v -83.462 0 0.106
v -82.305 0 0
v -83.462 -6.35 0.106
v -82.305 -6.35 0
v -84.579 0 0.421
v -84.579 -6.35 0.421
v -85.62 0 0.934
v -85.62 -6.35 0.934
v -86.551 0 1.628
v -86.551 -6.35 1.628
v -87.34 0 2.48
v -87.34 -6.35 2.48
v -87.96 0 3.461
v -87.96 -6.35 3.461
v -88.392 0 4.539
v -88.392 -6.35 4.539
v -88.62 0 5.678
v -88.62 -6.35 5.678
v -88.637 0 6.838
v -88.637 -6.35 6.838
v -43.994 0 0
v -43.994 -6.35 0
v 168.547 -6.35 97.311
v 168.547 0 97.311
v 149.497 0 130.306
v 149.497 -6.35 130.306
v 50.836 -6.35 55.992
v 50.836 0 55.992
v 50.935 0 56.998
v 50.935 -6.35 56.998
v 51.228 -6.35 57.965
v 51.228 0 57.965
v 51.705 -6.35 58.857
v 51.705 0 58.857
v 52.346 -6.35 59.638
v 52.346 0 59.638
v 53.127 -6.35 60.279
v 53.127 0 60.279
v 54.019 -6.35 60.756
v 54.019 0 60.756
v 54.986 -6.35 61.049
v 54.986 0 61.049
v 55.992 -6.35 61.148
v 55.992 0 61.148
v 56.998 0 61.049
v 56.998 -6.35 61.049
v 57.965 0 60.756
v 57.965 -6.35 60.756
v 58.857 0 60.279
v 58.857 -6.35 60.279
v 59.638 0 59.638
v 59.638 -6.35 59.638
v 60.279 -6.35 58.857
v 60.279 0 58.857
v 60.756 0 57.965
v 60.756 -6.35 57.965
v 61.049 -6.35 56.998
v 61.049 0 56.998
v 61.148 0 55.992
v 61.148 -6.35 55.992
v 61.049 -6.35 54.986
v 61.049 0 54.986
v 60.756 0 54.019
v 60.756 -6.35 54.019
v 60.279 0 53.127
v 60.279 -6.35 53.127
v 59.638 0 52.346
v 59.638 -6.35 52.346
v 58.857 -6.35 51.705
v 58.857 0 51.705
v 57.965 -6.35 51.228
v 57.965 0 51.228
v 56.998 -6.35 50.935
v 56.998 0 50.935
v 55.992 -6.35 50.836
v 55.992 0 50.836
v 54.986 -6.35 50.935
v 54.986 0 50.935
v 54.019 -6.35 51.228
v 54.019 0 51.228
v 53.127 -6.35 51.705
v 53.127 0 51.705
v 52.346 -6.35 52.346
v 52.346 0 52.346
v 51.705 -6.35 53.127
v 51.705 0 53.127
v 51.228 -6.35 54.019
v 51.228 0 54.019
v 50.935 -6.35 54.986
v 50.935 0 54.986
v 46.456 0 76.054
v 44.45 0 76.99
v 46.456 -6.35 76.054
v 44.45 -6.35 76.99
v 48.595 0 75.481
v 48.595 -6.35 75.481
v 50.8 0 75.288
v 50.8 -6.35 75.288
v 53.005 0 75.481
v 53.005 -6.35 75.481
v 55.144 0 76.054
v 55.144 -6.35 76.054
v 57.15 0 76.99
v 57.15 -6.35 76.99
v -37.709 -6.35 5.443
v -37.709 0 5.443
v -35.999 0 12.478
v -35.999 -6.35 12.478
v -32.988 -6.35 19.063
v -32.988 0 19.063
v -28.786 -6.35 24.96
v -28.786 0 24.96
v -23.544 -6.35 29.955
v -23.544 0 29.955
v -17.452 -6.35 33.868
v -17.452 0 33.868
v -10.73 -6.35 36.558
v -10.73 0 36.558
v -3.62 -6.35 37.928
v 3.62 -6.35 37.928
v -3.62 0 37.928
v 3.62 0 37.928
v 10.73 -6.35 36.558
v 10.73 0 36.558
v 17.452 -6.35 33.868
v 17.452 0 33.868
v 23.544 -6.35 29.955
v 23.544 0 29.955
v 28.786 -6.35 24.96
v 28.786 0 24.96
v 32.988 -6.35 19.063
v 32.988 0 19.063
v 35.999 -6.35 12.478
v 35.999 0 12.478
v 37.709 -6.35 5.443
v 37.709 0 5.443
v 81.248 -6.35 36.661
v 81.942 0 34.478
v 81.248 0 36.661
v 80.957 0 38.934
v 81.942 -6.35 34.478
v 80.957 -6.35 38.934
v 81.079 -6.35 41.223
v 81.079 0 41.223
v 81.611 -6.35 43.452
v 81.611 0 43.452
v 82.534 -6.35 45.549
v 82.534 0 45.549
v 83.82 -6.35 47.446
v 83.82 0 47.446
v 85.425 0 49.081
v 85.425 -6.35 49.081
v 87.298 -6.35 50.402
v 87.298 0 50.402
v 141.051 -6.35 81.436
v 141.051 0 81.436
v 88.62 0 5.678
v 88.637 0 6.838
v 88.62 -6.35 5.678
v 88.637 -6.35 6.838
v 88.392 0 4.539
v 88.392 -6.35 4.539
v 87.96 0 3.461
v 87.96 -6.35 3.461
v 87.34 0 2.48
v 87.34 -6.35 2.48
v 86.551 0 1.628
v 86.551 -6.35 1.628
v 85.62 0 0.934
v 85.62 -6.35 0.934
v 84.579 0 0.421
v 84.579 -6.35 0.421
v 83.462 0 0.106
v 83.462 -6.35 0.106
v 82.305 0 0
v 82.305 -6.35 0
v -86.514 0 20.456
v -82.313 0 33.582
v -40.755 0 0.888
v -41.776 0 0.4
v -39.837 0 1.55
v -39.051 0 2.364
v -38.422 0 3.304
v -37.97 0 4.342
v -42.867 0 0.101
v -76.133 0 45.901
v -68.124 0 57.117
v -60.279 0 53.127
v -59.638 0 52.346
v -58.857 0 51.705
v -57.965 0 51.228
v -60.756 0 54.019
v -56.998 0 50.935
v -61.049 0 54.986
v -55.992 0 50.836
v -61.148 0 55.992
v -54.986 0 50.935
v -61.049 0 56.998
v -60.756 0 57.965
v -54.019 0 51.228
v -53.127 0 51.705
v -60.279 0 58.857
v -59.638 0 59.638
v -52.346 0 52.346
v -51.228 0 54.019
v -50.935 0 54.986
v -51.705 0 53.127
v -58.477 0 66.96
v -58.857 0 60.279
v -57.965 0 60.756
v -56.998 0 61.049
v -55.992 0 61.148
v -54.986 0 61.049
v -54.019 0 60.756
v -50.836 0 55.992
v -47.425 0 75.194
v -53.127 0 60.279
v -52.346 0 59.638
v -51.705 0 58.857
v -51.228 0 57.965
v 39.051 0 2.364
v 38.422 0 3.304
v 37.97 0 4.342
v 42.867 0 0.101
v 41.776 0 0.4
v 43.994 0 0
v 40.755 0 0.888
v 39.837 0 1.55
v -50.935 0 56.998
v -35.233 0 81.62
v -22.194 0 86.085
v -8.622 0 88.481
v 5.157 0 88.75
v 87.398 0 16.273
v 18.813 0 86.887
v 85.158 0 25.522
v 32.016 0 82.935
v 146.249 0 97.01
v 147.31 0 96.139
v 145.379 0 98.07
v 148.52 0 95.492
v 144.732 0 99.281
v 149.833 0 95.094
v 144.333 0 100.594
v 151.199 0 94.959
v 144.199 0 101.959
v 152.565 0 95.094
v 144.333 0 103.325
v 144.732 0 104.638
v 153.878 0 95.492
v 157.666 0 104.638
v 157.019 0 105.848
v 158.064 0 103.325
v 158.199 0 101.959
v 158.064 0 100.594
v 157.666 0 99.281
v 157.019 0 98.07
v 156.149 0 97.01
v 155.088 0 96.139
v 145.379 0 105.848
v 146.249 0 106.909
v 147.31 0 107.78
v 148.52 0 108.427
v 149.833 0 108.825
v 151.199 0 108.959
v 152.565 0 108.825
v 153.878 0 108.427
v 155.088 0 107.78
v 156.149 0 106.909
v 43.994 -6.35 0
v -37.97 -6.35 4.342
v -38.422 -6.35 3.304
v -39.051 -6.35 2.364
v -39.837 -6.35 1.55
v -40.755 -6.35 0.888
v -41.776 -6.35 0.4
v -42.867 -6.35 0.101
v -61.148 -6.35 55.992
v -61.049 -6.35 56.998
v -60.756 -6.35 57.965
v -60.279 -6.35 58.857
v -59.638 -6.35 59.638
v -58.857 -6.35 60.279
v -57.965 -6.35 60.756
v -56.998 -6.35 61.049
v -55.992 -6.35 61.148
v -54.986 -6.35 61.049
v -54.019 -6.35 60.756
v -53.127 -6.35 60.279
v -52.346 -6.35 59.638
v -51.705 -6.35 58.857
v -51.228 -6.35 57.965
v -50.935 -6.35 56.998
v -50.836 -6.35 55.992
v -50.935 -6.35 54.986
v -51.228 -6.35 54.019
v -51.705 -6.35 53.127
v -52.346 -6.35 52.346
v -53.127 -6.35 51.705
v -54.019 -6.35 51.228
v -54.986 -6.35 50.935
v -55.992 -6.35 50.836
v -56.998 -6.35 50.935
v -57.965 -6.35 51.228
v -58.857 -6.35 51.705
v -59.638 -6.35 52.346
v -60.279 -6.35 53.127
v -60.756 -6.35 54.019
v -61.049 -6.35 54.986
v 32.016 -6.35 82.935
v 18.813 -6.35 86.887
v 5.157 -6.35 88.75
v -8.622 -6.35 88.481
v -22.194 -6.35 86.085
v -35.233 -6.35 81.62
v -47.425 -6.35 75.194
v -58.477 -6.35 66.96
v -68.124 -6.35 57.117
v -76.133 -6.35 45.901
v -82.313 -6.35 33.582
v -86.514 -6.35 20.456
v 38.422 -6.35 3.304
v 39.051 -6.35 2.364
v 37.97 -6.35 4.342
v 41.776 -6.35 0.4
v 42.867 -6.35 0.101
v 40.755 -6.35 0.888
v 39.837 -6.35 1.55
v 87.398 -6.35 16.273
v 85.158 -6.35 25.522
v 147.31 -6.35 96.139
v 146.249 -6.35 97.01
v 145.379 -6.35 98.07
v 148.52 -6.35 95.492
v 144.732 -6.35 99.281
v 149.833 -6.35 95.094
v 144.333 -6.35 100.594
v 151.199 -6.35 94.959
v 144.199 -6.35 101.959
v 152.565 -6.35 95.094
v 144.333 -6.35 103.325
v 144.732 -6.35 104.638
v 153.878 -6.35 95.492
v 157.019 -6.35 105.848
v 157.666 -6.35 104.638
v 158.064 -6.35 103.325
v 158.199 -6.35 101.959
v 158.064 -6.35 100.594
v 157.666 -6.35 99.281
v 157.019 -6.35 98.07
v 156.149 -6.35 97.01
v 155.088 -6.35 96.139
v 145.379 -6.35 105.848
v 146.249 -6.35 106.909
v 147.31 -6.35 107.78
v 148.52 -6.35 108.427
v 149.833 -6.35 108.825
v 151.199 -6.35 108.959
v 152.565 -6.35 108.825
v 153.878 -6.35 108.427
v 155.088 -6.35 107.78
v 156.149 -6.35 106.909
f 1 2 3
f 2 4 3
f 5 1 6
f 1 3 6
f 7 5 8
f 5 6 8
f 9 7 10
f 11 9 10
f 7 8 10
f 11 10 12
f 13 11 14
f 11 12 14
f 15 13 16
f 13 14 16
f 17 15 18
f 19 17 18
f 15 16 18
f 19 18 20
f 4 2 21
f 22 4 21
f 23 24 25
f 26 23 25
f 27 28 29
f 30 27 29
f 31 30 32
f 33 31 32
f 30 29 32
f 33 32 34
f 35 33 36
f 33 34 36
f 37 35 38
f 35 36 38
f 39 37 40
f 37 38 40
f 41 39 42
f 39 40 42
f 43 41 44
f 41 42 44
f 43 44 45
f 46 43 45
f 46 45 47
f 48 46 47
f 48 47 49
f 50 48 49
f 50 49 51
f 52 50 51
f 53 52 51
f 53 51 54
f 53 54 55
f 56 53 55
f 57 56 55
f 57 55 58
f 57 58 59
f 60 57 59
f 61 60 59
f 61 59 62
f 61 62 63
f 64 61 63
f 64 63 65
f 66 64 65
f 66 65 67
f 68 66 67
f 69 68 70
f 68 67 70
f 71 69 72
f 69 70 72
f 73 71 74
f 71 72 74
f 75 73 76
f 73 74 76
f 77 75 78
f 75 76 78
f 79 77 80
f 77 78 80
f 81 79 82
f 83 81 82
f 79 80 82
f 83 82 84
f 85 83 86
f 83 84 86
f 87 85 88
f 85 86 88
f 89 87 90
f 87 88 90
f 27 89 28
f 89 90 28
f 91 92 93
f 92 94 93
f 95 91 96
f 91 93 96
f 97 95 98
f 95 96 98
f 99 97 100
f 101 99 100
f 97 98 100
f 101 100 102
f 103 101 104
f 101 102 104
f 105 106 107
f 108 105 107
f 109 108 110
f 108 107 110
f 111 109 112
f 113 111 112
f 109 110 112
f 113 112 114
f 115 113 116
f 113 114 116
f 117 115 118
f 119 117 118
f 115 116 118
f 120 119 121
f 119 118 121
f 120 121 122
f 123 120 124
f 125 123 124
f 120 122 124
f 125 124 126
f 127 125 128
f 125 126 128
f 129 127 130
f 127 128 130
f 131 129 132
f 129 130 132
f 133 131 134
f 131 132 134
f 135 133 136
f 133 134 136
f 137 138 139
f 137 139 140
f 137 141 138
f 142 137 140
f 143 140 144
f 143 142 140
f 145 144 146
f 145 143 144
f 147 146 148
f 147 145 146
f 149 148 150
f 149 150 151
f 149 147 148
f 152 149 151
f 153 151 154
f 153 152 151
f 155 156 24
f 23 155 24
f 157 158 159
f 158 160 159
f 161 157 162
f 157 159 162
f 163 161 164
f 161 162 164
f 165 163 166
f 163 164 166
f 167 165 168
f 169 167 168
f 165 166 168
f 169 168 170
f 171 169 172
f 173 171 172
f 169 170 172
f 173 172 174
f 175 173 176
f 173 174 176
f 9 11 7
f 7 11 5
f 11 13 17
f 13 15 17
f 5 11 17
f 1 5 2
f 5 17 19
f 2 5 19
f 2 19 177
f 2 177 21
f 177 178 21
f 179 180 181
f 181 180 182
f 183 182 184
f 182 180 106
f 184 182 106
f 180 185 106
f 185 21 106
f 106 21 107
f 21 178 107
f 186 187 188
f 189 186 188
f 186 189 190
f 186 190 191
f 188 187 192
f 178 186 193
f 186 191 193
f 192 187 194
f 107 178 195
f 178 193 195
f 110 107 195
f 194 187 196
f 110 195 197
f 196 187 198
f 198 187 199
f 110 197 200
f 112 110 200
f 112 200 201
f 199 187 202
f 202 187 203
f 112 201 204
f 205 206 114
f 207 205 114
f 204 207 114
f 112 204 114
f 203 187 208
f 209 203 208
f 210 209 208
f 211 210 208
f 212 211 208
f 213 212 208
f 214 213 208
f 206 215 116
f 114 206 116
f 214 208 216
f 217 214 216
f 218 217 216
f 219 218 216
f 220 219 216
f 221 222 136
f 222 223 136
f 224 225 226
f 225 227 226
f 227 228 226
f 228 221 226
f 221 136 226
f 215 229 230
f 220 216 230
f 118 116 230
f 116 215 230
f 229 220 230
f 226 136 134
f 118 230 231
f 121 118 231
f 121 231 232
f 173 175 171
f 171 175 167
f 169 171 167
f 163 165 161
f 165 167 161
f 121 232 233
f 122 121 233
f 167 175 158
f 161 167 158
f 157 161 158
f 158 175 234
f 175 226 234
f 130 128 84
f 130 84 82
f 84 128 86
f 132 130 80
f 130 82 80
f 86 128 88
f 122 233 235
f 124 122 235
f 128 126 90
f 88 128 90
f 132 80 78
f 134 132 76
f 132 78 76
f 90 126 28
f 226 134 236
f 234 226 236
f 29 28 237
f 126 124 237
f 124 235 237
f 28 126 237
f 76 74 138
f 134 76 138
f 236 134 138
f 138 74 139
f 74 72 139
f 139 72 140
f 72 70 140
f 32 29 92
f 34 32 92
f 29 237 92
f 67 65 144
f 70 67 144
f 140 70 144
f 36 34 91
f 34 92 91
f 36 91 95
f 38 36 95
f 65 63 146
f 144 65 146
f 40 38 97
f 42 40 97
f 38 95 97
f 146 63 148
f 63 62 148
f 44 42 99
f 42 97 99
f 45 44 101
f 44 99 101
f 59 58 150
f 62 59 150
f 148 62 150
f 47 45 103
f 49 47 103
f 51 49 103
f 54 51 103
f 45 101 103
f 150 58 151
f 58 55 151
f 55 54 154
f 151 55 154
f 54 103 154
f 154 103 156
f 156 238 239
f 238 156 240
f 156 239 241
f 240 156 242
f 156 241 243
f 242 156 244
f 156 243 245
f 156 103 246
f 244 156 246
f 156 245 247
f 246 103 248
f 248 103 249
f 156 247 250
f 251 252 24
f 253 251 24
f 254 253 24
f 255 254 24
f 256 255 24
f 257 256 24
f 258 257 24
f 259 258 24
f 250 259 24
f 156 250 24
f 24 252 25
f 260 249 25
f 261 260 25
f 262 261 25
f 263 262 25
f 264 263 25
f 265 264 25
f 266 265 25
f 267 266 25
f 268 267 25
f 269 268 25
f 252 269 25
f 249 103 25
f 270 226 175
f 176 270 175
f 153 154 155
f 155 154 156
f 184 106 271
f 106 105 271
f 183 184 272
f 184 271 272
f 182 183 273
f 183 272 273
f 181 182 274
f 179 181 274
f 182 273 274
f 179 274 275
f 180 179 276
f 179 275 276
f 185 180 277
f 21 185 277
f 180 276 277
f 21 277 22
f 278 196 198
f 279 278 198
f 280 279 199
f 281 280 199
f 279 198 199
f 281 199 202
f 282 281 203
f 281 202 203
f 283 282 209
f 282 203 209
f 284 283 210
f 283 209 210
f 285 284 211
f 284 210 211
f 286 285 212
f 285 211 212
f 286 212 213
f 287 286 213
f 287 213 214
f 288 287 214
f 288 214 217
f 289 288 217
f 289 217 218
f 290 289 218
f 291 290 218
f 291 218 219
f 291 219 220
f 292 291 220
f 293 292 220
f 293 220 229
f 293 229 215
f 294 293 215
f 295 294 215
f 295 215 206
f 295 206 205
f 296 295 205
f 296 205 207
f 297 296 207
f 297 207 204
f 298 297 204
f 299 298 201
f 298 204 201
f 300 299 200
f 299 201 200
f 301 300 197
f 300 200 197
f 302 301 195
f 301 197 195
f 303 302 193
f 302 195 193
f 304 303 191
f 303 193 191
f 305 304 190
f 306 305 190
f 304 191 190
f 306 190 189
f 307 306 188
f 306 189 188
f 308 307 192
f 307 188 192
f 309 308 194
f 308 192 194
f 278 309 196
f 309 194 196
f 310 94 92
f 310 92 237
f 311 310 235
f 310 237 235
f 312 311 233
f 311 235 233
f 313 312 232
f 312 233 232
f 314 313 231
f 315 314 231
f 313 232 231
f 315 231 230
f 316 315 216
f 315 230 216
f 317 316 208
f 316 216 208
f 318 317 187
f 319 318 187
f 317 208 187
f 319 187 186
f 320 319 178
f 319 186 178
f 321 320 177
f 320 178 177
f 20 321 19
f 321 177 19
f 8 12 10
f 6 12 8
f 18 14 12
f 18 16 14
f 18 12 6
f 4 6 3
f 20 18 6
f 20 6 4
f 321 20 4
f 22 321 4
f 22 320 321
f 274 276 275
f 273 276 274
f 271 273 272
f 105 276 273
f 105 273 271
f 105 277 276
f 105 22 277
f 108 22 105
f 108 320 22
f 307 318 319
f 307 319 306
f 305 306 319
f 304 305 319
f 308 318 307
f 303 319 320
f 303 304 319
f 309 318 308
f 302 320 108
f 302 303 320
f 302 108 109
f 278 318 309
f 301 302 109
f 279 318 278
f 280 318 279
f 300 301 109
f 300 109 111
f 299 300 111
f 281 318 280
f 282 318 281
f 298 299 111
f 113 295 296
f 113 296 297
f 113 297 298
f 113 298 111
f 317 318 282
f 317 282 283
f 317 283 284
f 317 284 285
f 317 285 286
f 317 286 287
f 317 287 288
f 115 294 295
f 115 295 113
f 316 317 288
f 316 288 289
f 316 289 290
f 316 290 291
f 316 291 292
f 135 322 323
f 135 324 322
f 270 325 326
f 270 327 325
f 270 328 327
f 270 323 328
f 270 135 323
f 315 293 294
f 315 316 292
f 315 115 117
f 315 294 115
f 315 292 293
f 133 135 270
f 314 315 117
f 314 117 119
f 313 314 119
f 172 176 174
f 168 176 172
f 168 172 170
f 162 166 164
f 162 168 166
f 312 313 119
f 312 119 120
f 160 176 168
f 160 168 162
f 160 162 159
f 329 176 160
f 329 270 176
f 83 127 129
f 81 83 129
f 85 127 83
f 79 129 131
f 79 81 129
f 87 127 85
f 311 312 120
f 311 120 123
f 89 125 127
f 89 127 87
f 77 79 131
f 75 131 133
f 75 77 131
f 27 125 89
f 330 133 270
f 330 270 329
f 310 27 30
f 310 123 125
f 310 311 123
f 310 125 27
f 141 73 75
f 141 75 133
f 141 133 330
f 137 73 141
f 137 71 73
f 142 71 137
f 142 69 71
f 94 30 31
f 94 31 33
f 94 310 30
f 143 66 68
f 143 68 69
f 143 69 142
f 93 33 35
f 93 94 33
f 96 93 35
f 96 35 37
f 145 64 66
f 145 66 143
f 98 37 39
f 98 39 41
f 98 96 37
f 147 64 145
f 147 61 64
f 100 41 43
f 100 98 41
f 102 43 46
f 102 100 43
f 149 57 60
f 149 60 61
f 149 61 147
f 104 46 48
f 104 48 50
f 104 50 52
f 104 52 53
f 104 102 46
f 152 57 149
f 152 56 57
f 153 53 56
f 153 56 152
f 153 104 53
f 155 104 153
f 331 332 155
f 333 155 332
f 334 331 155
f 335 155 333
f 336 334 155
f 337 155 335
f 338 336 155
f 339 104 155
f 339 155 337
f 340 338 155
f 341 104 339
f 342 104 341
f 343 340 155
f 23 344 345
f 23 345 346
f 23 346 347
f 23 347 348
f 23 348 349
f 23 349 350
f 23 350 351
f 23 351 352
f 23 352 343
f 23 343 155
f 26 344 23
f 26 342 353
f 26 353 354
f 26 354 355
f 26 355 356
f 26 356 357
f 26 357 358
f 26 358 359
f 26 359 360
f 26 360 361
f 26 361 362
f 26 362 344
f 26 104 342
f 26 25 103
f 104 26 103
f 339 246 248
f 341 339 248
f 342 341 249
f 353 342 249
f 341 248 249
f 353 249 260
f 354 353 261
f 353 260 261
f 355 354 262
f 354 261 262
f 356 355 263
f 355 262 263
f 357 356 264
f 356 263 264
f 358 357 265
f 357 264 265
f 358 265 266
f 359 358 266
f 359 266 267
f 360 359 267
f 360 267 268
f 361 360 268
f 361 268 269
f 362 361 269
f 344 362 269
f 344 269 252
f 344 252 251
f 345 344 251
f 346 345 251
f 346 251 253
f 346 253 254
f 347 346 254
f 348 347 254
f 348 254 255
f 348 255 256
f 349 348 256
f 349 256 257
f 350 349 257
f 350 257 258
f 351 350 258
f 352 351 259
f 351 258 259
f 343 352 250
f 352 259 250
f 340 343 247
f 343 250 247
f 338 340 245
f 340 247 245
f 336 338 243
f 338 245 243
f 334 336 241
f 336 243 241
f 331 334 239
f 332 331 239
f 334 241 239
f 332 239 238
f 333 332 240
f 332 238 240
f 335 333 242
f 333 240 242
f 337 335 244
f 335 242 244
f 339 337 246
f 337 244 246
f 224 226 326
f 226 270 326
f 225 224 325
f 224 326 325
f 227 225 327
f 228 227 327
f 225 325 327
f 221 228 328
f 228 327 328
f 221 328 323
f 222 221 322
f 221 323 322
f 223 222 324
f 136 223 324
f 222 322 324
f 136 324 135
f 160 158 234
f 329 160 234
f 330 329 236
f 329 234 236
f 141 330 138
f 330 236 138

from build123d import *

# Parameters (mm, degrees)
F1_DEPTH = 6.35
F3_D     = 10.3124
F4_R     = 12.7
F5_R     = 6.35
F7_D     = 14


# Not quite as in the source:
# - a feature names something its author has since deleted; it is built from what else it names


with BuildPart() as f1:
    # F0 (on Front) → F1 (new body)
    with BuildSketch(Plane.XZ):
        with BuildLine():
            Line((38.1, 0), (88.9, 0))
            ThreePointArc((88.9, 0), (85.8708059571, 23.0090131096), (76.9896583964, 44.45))
            Line((76.9896583964, 44.45), (141.0511618856, 81.4359262841))
            Line((141.0511618856, 81.4359262841), (168.5474684557, 97.3109262841))
            Line((168.5474684557, 97.3109262841), (149.4974684557, 130.3064941683))
            Line((149.4974684557, 130.3064941683), (122.0011618856, 114.4314941683))
            Line((122.0011618856, 114.4314941683), (50.5107648032, 73.1564941683))
            ThreePointArc((50.5107648032, 73.1564941683), (-41.3086129578, 78.7198100576), (-88.9, 0))
            Line((-88.9, 0), (-38.1, 0))
            ThreePointArc((-38.1, 0), (0, 38.1), (38.1, 0))
        make_face()
    extrude(amount=F1_DEPTH)

    # F3 (through all)
    with Locations(Plane.XZ.offset(6.35)):
        with Locations((-55.9918969149, 55.9918969149), (55.9918969149, 55.9918969149)):
            Hole(F3_D / 2)

    # F4
    f4_edges = [f1.edges().sort_by_distance(p)[0] for p in [
        (50.510765, -3.175, 73.156494),
        (76.989658, -3.175, 44.45),
    ]]
    fillet(f4_edges, radius=F4_R)

    # F5
    f5_edges = [f1.edges().sort_by_distance(p)[0] for p in [
        (88.9, -3.175, 0),
        (38.1, -3.175, 0),
        (-38.1, -3.175, 0),
        (-88.9, -3.175, 0),
    ]]
    fillet(f5_edges, radius=F5_R)

    # F7 (through all)
    with Locations(Plane.XZ.offset(6.35)):
        with Locations((151.1989458277, 101.9594489122)):
            Hole(F7_D / 2)


solid = f1.part
